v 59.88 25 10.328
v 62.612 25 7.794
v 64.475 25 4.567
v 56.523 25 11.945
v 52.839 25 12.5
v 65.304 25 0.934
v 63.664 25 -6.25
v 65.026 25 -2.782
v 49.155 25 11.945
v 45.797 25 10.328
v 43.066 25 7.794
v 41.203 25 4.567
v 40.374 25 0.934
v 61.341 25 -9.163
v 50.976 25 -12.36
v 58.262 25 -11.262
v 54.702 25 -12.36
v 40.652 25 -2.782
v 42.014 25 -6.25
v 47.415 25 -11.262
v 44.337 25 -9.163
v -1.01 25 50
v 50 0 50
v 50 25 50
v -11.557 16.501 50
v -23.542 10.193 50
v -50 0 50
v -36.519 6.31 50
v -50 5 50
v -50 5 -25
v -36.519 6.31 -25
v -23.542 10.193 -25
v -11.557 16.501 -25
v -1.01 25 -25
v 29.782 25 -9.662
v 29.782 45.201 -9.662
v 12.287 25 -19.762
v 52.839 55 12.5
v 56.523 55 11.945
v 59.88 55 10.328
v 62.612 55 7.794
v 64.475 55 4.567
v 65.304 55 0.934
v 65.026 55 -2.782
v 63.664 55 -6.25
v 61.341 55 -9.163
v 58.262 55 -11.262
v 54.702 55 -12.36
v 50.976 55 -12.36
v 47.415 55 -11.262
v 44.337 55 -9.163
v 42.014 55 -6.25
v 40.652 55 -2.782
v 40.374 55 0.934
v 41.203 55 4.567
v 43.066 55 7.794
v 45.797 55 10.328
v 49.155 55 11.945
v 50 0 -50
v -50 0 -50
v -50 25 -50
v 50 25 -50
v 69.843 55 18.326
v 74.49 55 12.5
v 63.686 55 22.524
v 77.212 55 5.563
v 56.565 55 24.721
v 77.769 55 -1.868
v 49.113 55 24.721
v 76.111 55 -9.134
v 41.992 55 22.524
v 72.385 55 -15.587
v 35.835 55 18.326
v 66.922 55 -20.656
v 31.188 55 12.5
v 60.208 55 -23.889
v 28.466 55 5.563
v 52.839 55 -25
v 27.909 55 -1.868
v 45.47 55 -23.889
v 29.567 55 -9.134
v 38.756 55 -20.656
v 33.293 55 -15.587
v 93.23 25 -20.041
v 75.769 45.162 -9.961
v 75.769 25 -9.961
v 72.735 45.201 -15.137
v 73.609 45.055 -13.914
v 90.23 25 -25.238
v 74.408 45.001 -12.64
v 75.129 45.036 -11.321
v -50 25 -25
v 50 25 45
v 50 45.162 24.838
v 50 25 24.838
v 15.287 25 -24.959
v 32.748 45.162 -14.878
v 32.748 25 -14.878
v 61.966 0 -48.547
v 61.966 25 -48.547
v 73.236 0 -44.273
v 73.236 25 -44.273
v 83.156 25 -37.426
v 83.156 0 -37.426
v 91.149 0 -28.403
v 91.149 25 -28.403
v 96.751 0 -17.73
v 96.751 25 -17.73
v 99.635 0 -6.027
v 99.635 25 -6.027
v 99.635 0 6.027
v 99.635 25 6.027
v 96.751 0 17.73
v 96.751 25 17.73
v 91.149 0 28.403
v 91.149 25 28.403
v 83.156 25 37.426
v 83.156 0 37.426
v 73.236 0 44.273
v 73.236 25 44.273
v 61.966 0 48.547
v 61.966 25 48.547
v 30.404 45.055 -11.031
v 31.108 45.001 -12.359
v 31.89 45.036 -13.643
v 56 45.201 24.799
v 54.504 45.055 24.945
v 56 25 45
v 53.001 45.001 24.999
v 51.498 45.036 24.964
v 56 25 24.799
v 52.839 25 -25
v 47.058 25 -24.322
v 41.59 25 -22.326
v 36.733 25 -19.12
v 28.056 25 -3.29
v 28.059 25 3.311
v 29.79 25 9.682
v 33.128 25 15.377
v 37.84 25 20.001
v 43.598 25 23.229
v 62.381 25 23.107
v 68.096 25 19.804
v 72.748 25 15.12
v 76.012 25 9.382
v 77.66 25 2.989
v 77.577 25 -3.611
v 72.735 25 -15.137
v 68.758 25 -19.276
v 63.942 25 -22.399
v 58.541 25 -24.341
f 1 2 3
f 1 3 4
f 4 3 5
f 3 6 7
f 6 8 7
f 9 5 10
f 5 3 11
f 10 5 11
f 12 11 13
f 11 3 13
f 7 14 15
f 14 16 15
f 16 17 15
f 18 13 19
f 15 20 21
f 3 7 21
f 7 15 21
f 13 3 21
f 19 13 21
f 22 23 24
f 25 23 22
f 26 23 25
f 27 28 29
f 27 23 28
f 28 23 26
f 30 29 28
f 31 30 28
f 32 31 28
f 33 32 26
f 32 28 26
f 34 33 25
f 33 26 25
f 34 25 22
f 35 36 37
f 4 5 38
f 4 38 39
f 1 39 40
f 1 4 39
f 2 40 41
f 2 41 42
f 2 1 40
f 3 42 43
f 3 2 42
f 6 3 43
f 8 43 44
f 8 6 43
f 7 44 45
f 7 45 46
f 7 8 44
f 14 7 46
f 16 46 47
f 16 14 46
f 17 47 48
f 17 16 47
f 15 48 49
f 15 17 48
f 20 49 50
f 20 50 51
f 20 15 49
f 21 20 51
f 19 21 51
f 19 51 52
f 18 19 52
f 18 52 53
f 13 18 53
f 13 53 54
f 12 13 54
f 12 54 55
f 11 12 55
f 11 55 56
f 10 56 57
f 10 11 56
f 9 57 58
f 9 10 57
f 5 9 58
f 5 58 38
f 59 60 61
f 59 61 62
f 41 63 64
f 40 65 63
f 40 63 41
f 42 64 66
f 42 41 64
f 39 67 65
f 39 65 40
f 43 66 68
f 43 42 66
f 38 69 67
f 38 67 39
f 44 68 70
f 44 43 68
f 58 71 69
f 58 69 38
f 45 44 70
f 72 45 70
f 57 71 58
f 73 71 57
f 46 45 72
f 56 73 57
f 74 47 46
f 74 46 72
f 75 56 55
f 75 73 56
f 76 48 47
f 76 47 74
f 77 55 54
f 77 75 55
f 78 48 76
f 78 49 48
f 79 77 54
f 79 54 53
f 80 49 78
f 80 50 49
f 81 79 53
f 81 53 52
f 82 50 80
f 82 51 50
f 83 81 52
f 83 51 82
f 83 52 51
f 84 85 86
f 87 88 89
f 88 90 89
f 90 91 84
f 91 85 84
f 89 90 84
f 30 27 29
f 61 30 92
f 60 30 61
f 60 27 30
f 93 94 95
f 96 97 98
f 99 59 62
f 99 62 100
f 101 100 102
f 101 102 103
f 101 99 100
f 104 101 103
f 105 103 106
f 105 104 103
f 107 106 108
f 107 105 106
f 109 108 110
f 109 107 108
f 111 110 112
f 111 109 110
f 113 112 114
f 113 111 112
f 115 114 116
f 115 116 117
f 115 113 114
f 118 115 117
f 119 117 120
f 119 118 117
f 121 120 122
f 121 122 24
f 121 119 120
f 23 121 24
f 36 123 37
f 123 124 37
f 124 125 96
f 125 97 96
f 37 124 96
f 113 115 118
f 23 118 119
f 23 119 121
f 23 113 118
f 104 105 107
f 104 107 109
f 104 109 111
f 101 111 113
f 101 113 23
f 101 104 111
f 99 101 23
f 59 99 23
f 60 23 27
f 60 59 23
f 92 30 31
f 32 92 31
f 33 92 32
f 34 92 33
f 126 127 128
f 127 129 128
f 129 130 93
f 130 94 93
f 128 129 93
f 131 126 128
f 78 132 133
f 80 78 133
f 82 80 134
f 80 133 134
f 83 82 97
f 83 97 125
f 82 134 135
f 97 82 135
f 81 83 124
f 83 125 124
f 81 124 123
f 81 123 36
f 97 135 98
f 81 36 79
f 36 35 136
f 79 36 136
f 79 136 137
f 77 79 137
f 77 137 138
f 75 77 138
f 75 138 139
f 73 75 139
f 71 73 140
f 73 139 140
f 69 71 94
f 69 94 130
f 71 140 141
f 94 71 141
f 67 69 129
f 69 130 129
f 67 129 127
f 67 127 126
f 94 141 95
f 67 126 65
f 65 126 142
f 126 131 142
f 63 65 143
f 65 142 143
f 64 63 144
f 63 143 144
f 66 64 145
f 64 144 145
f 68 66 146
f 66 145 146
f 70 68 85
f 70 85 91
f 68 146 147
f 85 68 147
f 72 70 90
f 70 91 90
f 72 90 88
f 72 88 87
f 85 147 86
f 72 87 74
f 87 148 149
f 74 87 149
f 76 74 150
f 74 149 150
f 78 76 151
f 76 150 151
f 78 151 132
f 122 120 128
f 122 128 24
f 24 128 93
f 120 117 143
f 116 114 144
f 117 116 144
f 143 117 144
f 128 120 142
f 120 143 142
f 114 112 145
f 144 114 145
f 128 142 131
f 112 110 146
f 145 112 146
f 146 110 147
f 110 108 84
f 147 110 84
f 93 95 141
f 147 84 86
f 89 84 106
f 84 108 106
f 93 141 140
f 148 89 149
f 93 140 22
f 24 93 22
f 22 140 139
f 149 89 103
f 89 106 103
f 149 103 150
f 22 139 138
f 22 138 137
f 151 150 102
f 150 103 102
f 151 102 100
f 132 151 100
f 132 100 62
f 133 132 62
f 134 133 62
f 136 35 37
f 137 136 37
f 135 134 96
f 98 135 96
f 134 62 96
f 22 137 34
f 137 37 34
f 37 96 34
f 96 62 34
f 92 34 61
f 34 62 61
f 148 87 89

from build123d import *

# Parameters (mm, degrees)
BOSS_EXTRUDE1_DEPTH = 25
CUT_EXTRUDE1_DEPTH  = 75
SKETCH3_R           = 25
SKETCH3_R_2         = 12.5
BOSS_EXTRUDE2_DEPTH = 30
RIB2_REACH          = 129.02
SKETCH5_WALL_W      = 284.323638276
SKETCH5_WALL_H      = 6
CIRPATTERN1_COUNT   = 3


with BuildPart() as part:
    # Sketch1 → Boss-Extrude1 (new body)
    with BuildSketch(Plane(origin=(0, 0, 0), x_dir=(1, 0, 0), z_dir=(0, 1, 0))):
        with BuildLine():
            Line((-50, 50), (50, 50))
            ThreePointArc((50, 50), (100, 0), (50, -50))
            Line((50, -50), (-50, -50))
            Line((-50, -50), (-50, 50))
        make_face()
    extrude(amount=BOSS_EXTRUDE1_DEPTH)

    # Sketch2 → Cut-Extrude1 (cut)
    with BuildSketch(Plane.XY.offset(50)):
        with BuildLine():
            Line((-1.010205144, 25), (-50, 25))
            Line((-50, 25), (-50, 5))
            ThreePointArc((-50, 5), (-23.542486889, 10.192593016), (-1.010205144, 25))
        make_face()
    extrude(amount=-CUT_EXTRUDE1_DEPTH, mode=Mode.SUBTRACT)

    # Sketch3 → Boss-Extrude2 (add)
    with BuildSketch(Plane(origin=(0, 25, 0), x_dir=(1, 0, 0), z_dir=(0, 1, 0))):
        with Locations(Location((52.838951486, 0, 0), (0, 0, 90))):
            Circle(SKETCH3_R)
        with Locations(Location((52.838951486, 0, 0), (0, 0, 270))):
            Circle(SKETCH3_R_2, mode=Mode.SUBTRACT)
    extrude(amount=BOSS_EXTRUDE2_DEPTH)

    # Sketch5 wall → Rib2 (add, up to next)
    with BuildSketch(Plane(origin=(53, 35, 35), x_dir=(0, -0.707106781187, 0.707106781187), z_dir=(0, -0.707106781187, -0.707106781187)), mode=Mode.PRIVATE) as rib2_sk1:
        Rectangle(SKETCH5_WALL_W, SKETCH5_WALL_H)
    rib2_tool1 = extrude(rib2_sk1.sketch, amount=RIB2_REACH, mode=Mode.PRIVATE) - part.part
    rib2 = rib2_tool1.solids().sort_by_distance((53, 35, 35))[0]
    add(rib2)

    # CirPattern1: Rib2 ×3 about axis
    cirpattern1_axis = Axis((52.838951486, 0, 0), (0, 1, 0))
    for i in range(1, CIRPATTERN1_COUNT):
        add(rib2.rotate(cirpattern1_axis, i * 360 / CIRPATTERN1_COUNT))


solid = part.part
